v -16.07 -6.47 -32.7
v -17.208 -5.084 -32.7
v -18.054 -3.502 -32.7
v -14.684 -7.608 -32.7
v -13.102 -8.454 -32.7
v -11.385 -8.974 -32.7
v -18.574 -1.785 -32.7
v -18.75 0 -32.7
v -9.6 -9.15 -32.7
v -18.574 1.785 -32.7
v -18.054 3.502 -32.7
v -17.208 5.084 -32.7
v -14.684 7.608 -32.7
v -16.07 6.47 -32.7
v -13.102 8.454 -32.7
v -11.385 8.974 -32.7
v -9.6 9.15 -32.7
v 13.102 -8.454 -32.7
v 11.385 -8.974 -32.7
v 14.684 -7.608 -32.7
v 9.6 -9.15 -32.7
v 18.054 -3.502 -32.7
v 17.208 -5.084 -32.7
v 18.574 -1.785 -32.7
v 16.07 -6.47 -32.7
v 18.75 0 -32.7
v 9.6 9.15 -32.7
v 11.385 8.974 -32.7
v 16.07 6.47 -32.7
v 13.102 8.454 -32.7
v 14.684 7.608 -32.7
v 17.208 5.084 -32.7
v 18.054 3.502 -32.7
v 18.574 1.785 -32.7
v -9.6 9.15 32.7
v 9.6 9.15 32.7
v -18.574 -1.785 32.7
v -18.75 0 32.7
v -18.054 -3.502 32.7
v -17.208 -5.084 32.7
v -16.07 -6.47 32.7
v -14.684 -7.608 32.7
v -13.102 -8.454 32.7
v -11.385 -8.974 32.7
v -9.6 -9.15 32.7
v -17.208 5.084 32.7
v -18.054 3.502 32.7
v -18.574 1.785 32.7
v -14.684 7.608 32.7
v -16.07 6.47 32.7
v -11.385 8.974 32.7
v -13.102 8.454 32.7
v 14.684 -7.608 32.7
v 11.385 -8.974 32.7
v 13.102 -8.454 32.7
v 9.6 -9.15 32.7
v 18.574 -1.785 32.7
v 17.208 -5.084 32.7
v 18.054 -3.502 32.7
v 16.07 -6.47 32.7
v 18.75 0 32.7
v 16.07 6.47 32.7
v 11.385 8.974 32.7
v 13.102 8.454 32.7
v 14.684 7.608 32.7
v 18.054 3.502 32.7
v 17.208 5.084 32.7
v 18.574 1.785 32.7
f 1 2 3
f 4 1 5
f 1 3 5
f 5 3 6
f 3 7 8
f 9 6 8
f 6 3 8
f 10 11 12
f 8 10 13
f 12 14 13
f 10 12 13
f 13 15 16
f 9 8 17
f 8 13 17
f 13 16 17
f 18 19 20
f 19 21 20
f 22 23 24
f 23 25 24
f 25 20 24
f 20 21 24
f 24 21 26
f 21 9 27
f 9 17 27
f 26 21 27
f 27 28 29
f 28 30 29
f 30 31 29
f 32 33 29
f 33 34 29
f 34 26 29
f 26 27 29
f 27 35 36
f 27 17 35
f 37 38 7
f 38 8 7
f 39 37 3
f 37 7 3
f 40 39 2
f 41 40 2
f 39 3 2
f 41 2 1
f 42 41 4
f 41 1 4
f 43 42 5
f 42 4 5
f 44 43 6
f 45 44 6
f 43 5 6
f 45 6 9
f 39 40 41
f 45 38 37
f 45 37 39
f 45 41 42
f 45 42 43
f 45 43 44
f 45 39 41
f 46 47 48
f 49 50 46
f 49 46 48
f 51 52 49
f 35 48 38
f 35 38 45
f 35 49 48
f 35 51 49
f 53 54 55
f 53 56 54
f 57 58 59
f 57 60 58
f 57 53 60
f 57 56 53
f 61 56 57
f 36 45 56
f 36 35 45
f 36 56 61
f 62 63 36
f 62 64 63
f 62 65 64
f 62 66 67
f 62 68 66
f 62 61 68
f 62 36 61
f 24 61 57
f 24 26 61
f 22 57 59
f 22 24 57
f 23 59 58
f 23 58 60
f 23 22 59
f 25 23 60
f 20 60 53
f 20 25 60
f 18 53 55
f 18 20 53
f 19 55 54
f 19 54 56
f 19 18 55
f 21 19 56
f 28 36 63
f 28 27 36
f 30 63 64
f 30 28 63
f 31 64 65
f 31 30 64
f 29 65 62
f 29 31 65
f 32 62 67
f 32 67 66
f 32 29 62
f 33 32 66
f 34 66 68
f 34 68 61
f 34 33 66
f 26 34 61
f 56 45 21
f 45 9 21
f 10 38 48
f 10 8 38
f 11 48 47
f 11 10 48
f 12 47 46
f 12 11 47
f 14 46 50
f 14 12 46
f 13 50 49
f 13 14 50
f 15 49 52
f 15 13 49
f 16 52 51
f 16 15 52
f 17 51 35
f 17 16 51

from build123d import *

# Parameters (mm, degrees)
SKETCH1_W           = 37.5
SKETCH1_H           = 65.4
BOSS_EXTRUDE1_DEPTH = 9.15
FILLET1_R           = 9.15


with BuildPart() as part:
    # Sketch1 → Boss-Extrude1 (new, symmetric)
    with BuildSketch(Plane(origin=(0, 0, 0), x_dir=(1, 0, 0), z_dir=(0, 1, 0))):
        Rectangle(SKETCH1_W, SKETCH1_H)
    extrude(amount=BOSS_EXTRUDE1_DEPTH, both=True)

    # Fillet1
    fillet1_edges = [part.edges().sort_by_distance(p)[0] for p in [
        (18.75, -9.15, 0),
        (18.75, 9.15, 0),
        (-18.75, -9.15, 0),
        (-18.75, 9.15, 0),
    ]]
    fillet(fillet1_edges, radius=FILLET1_R - 0.0001)  # a hair under: the kernel refuses the full size


solid = part.part
